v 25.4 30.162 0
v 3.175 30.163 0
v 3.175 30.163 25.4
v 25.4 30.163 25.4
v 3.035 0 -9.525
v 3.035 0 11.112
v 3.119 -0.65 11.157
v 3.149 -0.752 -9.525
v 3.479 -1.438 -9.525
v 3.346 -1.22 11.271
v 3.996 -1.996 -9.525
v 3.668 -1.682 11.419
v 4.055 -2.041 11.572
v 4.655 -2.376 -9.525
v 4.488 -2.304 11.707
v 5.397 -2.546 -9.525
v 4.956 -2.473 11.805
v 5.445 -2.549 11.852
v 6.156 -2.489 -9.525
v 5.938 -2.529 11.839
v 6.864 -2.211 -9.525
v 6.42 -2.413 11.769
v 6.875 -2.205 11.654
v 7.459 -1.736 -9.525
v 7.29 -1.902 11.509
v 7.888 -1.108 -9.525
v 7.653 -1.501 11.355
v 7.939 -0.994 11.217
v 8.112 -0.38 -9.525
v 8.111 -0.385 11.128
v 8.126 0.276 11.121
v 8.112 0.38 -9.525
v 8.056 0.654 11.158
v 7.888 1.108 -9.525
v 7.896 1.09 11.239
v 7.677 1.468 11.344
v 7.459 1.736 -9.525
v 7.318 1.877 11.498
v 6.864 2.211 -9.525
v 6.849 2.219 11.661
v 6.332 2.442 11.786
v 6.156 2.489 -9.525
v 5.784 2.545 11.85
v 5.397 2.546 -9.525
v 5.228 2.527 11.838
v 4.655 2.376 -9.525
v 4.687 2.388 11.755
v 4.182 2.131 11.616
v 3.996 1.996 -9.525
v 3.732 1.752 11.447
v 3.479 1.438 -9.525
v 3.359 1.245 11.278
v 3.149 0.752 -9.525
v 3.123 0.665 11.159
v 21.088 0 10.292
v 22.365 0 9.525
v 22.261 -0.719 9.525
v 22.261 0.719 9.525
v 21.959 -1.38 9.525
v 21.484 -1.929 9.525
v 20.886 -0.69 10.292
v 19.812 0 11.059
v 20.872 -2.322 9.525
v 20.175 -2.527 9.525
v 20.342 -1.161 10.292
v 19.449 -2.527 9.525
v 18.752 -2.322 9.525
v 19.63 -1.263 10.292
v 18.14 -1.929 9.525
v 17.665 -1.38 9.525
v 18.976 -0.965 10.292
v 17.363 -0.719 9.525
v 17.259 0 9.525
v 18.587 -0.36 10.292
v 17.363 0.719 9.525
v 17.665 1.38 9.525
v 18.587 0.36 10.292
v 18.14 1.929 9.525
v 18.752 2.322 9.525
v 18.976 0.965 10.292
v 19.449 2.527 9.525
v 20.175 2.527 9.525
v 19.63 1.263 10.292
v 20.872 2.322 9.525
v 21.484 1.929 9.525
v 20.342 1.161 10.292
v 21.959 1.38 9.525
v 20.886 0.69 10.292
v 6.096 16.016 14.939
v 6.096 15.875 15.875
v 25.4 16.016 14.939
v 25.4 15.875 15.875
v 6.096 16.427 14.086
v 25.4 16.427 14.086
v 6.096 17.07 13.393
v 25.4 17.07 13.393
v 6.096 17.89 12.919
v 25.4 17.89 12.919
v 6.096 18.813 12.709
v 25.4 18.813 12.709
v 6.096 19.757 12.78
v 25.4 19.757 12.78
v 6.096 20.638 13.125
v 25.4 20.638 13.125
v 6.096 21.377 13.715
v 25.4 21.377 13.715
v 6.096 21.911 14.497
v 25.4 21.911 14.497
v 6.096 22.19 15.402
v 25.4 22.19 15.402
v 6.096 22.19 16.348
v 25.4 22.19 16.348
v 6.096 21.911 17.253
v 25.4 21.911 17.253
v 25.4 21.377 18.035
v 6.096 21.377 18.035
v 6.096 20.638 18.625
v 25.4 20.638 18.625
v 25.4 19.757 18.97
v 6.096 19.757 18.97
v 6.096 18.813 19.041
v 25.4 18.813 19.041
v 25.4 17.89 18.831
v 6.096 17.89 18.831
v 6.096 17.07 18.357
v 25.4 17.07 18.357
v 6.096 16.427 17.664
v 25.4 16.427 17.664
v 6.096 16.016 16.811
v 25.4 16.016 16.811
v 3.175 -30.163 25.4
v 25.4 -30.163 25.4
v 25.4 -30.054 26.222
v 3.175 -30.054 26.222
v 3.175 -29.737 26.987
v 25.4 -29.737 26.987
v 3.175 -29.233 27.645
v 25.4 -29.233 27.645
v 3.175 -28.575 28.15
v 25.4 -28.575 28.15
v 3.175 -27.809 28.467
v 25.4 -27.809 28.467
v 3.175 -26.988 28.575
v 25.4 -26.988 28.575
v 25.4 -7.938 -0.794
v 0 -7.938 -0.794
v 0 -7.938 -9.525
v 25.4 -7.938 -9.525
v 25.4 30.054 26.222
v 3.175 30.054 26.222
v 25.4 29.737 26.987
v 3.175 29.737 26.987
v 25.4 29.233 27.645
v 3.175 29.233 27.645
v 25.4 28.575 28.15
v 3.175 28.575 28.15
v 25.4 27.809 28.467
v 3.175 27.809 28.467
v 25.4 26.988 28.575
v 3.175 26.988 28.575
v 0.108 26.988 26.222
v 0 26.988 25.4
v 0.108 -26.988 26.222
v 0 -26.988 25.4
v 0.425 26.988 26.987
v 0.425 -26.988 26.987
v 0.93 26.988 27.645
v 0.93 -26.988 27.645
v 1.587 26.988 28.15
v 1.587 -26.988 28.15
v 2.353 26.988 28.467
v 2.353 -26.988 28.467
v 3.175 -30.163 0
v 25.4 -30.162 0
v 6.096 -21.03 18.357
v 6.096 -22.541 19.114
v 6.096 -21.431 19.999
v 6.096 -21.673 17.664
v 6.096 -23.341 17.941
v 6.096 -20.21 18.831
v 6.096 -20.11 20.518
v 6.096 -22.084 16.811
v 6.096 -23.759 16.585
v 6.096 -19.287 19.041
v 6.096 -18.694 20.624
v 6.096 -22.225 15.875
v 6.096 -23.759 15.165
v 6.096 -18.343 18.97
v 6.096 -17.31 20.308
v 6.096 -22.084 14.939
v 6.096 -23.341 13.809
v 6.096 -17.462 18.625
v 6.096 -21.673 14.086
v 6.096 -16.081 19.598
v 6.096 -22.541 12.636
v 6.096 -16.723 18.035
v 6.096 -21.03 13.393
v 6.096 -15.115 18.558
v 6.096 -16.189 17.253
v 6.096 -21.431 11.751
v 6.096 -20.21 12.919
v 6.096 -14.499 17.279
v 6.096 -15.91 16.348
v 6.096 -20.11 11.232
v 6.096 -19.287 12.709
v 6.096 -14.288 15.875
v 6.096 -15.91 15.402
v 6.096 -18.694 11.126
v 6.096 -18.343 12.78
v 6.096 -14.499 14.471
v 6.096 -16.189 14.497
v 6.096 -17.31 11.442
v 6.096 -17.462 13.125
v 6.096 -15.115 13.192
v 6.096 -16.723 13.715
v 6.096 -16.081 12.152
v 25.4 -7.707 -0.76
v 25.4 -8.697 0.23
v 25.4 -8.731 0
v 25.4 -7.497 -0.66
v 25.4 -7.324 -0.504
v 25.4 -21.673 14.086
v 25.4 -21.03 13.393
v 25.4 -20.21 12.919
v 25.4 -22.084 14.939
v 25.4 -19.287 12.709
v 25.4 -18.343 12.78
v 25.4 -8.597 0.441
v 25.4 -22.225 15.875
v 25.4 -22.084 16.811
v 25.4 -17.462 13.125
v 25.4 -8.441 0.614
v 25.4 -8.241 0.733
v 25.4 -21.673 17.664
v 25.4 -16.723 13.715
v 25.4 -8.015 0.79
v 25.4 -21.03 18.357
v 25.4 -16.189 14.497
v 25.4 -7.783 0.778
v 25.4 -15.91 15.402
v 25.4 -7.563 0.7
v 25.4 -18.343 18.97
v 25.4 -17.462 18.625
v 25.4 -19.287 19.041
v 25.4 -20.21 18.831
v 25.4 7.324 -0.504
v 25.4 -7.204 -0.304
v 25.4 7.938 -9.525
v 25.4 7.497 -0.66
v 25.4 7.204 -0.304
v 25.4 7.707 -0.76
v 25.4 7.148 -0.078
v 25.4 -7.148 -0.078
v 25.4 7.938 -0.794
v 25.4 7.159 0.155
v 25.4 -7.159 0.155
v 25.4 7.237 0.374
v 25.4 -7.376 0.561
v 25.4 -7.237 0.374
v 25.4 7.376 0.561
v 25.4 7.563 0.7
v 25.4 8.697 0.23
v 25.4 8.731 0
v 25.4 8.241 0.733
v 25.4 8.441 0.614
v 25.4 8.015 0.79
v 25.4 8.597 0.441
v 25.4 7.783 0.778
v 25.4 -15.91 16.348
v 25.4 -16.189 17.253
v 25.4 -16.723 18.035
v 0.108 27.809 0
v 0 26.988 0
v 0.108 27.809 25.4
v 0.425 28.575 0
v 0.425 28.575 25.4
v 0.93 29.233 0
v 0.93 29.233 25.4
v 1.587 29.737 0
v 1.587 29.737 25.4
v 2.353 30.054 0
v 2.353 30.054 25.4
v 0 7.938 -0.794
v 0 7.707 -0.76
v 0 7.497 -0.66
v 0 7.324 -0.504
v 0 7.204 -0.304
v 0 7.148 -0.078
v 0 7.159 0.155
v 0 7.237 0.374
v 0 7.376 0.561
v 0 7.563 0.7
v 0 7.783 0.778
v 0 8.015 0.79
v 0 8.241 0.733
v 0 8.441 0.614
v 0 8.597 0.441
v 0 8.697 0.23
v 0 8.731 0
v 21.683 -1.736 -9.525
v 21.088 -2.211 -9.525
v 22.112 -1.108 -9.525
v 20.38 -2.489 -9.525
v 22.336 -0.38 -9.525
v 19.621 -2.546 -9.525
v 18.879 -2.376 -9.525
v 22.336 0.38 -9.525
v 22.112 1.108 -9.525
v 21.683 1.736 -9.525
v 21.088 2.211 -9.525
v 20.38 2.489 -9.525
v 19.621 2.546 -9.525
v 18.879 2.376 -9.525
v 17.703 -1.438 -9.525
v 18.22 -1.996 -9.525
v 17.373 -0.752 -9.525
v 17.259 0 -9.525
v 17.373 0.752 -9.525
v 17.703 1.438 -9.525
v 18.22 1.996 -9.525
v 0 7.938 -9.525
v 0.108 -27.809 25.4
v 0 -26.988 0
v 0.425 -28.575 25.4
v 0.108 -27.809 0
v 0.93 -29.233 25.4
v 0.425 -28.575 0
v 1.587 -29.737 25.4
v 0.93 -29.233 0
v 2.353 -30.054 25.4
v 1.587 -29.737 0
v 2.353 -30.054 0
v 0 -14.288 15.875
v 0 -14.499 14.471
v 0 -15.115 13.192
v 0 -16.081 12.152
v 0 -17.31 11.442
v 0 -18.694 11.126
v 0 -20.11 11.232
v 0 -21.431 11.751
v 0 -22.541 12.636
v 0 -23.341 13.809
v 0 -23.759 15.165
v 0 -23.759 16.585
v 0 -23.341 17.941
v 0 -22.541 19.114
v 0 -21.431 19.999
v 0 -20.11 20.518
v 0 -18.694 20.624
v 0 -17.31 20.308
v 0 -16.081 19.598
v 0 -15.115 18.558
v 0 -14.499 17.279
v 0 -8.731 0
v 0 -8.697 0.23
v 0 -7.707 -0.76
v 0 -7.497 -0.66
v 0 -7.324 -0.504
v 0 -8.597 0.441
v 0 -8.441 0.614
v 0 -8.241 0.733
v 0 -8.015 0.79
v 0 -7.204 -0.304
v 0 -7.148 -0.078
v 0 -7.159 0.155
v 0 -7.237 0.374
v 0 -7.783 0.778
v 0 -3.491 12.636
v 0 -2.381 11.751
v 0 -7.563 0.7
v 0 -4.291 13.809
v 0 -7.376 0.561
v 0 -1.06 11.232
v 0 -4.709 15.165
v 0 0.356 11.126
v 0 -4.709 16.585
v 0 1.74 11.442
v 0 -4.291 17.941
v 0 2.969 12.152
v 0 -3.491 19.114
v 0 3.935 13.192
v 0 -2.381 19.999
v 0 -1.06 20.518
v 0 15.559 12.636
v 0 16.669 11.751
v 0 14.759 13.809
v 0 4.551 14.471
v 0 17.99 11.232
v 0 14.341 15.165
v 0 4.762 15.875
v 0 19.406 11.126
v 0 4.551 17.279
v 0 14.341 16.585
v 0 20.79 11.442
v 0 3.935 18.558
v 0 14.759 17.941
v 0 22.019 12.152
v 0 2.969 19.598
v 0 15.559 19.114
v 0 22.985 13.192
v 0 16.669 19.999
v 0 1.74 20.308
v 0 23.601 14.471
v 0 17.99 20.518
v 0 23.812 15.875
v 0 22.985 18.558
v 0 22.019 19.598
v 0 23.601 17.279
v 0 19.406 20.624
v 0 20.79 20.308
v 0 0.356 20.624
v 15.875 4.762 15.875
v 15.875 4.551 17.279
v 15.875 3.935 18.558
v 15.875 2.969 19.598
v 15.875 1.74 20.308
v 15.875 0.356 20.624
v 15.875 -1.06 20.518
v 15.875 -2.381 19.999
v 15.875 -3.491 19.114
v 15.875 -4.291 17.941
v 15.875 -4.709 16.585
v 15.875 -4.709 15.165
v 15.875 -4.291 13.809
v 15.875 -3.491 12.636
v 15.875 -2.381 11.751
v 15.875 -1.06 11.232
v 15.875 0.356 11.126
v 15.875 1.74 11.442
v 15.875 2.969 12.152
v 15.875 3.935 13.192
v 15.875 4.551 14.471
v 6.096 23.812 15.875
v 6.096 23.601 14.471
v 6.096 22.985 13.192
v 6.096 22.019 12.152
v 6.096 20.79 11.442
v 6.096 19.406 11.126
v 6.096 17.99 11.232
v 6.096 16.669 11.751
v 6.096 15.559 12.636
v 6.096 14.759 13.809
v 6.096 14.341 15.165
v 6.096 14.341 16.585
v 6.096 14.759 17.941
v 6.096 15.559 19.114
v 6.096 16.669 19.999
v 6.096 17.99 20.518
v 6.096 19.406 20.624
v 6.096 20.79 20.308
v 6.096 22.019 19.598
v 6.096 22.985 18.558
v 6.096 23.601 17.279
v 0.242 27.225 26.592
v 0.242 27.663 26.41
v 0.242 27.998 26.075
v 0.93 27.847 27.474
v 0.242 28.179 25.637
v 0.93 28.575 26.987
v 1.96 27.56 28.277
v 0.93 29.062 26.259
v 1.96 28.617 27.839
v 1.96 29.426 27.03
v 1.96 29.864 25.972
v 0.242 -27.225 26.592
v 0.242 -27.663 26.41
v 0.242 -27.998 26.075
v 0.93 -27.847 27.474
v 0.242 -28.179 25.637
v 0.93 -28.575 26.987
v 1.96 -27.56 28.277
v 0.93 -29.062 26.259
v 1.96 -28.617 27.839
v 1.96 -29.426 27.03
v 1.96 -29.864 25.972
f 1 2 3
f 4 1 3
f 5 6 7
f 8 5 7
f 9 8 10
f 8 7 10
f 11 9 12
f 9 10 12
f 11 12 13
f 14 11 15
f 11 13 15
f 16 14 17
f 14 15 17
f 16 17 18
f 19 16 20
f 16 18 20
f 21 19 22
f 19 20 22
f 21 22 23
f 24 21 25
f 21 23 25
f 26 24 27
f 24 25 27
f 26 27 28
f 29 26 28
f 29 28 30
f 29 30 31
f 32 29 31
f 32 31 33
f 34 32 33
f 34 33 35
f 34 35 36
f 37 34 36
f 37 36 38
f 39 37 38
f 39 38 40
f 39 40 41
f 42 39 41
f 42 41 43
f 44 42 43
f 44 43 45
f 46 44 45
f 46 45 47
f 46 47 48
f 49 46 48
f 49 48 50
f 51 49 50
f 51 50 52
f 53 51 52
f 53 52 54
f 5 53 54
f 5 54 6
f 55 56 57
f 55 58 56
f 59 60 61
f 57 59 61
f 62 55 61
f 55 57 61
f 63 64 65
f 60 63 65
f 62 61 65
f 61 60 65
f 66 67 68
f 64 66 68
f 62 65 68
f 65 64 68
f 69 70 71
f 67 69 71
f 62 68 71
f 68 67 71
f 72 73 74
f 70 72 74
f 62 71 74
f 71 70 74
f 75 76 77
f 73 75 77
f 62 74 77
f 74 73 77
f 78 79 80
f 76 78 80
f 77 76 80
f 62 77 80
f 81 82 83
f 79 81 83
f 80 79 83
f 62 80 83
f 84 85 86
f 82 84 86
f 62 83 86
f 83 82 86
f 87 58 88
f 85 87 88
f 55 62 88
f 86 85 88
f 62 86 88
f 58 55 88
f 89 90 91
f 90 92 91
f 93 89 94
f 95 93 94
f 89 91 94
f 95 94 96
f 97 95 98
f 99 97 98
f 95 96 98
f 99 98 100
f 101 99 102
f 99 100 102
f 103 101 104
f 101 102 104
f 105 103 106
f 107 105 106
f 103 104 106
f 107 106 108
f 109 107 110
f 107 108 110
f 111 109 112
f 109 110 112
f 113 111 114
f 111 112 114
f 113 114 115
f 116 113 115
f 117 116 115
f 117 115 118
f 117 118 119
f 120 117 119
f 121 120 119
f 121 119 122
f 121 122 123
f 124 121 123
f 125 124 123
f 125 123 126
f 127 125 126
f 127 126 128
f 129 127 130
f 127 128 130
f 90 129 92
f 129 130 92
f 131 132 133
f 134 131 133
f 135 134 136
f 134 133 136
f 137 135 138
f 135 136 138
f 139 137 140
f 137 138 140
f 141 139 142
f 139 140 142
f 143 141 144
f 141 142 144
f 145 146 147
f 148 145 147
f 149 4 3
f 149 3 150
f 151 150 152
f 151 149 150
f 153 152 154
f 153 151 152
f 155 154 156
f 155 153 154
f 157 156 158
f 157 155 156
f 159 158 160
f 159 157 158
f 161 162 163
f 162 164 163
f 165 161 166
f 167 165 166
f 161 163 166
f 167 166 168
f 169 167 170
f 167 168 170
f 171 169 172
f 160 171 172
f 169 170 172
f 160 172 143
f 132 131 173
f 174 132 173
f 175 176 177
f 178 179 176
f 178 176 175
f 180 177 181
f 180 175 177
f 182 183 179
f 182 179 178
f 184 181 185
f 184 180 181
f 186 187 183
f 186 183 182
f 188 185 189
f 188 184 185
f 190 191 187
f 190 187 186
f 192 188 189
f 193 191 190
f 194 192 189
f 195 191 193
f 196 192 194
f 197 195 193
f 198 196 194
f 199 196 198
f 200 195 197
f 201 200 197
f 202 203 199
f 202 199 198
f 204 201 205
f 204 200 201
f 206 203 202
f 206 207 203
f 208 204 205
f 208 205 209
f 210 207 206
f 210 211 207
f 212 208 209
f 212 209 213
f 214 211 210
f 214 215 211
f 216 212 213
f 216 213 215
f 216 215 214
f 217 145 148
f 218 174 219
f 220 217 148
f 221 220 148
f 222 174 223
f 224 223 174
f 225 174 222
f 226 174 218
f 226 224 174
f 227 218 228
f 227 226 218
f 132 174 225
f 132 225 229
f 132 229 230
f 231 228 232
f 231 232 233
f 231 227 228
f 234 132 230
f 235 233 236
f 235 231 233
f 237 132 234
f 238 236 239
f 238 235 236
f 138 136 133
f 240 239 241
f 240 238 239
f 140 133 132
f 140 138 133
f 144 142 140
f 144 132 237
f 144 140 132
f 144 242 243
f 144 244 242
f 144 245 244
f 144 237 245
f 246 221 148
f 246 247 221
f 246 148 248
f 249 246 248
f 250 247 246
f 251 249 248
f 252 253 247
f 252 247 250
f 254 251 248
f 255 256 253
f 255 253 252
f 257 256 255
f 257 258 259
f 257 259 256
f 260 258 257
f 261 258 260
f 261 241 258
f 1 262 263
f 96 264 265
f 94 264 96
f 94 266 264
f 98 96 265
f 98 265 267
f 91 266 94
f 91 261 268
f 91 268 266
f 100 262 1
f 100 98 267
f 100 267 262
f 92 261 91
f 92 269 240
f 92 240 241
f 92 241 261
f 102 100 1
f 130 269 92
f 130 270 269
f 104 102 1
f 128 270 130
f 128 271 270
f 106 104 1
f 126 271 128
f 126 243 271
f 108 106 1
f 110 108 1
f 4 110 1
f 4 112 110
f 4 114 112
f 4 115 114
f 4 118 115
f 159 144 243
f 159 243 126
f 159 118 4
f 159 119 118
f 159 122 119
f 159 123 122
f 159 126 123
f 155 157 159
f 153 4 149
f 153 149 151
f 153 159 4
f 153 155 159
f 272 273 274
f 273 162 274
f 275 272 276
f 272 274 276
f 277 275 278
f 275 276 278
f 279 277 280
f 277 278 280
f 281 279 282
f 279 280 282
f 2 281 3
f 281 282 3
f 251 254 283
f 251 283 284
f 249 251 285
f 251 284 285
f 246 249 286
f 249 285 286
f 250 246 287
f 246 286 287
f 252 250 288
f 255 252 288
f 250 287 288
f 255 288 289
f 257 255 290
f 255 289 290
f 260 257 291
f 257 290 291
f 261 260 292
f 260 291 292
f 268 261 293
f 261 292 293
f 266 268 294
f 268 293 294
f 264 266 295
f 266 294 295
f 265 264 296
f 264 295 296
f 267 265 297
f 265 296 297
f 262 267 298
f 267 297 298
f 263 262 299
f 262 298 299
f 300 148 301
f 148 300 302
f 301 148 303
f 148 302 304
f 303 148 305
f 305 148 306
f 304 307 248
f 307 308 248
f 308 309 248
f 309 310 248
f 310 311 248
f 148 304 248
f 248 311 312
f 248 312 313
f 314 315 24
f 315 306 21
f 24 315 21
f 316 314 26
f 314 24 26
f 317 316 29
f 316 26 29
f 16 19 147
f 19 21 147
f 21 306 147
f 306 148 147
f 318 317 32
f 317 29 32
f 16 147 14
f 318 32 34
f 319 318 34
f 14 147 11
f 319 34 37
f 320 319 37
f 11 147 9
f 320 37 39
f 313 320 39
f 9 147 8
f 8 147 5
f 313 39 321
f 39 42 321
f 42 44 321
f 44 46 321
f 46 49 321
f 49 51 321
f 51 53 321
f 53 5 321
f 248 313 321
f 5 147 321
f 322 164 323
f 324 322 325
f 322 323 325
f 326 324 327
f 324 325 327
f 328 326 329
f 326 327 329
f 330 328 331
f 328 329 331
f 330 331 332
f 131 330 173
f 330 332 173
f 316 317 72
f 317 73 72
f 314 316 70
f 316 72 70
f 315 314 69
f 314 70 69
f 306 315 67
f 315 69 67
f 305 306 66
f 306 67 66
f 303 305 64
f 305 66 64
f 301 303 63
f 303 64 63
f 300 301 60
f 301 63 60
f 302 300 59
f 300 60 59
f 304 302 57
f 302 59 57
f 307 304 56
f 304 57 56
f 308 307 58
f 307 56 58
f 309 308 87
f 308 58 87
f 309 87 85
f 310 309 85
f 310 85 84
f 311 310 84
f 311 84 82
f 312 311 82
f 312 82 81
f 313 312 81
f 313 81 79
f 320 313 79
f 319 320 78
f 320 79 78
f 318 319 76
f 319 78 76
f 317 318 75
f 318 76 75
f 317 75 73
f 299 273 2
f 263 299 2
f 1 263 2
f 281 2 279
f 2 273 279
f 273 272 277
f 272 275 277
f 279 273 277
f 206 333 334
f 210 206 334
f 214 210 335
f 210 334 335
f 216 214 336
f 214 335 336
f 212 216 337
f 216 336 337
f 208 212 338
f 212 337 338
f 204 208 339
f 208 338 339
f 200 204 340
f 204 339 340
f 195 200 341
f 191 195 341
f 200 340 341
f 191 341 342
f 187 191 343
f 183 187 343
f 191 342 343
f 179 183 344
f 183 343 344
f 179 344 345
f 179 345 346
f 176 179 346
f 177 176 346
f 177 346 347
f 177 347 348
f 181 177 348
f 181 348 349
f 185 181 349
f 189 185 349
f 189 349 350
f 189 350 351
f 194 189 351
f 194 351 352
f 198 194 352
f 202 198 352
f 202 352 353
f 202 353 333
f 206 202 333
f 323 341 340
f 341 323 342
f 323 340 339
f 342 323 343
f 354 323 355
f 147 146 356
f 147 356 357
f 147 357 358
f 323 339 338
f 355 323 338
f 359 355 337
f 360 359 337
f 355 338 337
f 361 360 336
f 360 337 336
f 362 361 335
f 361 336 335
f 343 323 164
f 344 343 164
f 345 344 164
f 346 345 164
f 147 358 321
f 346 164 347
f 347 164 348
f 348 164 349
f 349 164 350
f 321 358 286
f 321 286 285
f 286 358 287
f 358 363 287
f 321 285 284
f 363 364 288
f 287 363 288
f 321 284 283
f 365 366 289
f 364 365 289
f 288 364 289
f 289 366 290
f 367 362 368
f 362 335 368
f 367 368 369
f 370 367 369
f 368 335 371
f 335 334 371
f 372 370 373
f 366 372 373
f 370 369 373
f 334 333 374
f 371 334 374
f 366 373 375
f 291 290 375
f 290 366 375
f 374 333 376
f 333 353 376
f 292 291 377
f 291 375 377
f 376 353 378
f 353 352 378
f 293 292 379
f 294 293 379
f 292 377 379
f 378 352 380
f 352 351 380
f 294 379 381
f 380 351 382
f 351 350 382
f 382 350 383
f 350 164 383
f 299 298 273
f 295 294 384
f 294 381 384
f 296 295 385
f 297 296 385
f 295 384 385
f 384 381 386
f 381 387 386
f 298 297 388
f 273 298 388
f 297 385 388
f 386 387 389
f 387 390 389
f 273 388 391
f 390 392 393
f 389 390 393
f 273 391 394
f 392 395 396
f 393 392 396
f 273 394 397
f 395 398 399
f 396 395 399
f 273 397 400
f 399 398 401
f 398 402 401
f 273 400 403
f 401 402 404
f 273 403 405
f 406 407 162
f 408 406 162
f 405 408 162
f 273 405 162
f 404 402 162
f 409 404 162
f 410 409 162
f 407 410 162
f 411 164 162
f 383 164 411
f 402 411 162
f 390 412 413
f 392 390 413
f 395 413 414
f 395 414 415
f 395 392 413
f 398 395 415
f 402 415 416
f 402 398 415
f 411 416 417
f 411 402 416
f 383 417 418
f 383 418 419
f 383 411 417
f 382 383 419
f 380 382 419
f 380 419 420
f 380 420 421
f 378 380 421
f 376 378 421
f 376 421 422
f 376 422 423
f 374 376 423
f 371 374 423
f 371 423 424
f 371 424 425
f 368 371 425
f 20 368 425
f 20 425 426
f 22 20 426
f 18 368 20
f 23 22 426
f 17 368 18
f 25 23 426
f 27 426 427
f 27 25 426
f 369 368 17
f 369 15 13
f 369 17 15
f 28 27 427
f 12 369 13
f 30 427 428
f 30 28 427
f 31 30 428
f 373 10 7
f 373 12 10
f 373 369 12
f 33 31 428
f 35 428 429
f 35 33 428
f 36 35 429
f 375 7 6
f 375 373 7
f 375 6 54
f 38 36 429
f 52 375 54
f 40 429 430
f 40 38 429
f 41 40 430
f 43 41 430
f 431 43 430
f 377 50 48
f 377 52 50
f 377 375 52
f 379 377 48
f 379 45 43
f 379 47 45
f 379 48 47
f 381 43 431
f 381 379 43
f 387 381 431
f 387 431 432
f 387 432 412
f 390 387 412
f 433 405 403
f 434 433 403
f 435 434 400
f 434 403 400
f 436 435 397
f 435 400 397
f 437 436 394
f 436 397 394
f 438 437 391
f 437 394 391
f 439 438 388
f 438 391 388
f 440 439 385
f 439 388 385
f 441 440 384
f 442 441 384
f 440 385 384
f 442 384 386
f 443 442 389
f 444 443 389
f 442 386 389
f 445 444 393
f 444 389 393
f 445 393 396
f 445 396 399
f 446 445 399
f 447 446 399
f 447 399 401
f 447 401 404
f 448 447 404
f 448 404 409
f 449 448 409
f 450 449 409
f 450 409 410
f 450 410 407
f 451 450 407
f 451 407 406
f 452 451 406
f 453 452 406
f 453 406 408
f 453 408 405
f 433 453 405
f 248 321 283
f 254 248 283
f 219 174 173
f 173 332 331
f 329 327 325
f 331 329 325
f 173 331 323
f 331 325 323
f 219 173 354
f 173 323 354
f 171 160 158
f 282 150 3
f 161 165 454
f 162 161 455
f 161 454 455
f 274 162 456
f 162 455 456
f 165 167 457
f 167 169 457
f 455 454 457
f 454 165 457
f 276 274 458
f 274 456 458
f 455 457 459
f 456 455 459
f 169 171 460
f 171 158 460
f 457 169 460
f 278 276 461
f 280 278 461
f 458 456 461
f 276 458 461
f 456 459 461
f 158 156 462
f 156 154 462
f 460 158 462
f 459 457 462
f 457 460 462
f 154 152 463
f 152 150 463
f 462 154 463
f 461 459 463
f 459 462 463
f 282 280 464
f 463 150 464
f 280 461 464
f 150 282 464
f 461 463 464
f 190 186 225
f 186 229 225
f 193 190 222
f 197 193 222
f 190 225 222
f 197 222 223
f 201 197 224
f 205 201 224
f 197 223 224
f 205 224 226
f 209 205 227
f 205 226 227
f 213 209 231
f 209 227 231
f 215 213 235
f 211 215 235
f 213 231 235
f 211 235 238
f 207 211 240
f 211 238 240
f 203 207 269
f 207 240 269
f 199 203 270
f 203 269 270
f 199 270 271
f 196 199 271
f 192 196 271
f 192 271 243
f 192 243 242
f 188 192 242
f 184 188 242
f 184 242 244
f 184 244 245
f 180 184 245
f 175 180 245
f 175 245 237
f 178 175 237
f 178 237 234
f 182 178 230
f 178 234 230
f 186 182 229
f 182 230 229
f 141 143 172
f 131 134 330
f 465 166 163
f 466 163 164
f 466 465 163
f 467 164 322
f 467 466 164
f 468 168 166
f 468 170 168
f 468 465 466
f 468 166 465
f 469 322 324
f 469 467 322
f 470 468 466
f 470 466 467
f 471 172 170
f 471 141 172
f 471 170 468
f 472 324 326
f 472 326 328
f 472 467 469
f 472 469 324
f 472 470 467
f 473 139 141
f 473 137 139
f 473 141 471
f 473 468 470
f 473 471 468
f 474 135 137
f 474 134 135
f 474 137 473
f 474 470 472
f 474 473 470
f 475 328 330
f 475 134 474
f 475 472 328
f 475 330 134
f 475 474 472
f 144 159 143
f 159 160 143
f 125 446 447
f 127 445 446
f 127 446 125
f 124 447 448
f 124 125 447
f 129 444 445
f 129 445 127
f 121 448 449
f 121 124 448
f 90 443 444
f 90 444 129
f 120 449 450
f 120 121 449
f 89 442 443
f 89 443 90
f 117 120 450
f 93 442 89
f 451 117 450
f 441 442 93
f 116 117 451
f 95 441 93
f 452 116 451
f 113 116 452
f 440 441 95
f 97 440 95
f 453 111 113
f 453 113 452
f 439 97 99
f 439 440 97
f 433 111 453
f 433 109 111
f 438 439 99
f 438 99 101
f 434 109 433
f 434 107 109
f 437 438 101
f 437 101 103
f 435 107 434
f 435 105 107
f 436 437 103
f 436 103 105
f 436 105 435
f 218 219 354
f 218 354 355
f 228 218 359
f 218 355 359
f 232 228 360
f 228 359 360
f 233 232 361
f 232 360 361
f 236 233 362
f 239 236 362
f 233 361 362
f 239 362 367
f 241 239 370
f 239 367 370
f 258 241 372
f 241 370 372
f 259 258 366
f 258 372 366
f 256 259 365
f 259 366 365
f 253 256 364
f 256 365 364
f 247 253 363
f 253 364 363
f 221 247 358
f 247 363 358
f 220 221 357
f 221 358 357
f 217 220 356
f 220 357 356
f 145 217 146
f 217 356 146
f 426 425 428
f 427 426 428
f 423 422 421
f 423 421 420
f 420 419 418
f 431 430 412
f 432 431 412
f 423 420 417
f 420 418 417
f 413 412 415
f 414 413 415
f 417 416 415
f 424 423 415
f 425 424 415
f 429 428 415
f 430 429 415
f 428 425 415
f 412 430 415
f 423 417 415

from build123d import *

# Parameters (mm, degrees)
F0_R           = 4.7625
F1_DEPTH       = 25.4
F2_D           = 6.35
F2_CBORE_D     = 9.525
F2_CBORE_DEPTH = 6.096
F3_DEPTH       = 15.875
F4_R           = 3.175
F6_D           = 5.1054
F6_DEPTH       = 25.4
F6_TIP         = 1.5338169022
F7_D           = 5.1054
F7_DEPTH       = 19.05
F7_TIP         = 1.5338169022


with BuildPart() as f1:
    # F0 (on Right) → F1 (new body)
    with BuildSketch(Plane.YZ):
        with BuildLine():
            Line((-7.9375, -9.525), (0, -9.525))
            Line((0, -9.525), (7.9375, -9.525))
            Line((7.9375, -9.525), (7.9375, -0.79375))
            ThreePointArc((7.9375, -0.79375), (7.3762339924, 0.5612660076), (8.73125, 0))
            Line((8.73125, 0), (30.1625, 0))
            Line((30.1625, 0), (30.1625, 28.575))
            Line((30.1625, 28.575), (0, 28.575))
            Line((0, 28.575), (-30.1625, 28.575))
            Line((-30.1625, 28.575), (-30.1625, 0))
            Line((-30.1625, 0), (-8.73125, 0))
            ThreePointArc((-8.73125, 0), (-7.3762339924, 0.5612660076), (-7.9375, -0.79375))
            Line((-7.9375, -0.79375), (-7.9375, -9.525))
        make_face()
        with Locations((0, 15.875)):
            Circle(F0_R, mode=Mode.SUBTRACT)
        with Locations((0, 15.875)):
            Circle(F0_R)
    extrude(amount=F1_DEPTH)

    # F2 (through all)
    with Locations(Plane(origin=(0, 0, 0), x_dir=(0, 1, 0), z_dir=(-1, 0, 0))):
        with Locations((-19.05, -15.875), (19.05, -15.875)):
            CounterBoreHole(F2_D / 2, F2_CBORE_D / 2, F2_CBORE_DEPTH)

    # F0 (on Right) → F3 (cut)
    with BuildSketch(Plane.YZ):
        with Locations((0, 15.875)):
            Circle(F0_R)
    extrude(amount=F3_DEPTH, mode=Mode.SUBTRACT)

    # F4
    f4_edges = [f1.edges().sort_by_distance(p)[0] for p in [
        (12.7, -30.1625, 28.575),
        (12.7, 30.1625, 28.575),
        (0, 0, 28.575),
        (0, -30.1625, 14.2875),
        (0, 30.1625, 14.2875),
    ]]
    fillet(f4_edges, radius=F4_R)

    # F6
    with Locations(Plane(origin=(0, 0, -9.525), x_dir=(1, 0, 0), z_dir=(0, 0, -1))):
        with Locations((5.588, 0)):
            Hole(F6_D / 2, depth=F6_DEPTH)
            with Locations((0, 0, -(F6_DEPTH + F6_TIP / 2))):  # 118° drill point
                Cone(0, F6_D / 2, F6_TIP, mode=Mode.SUBTRACT)

    # F7
    with Locations(Plane(origin=(0, 0, -9.525), x_dir=(1, 0, 0), z_dir=(0, 0, -1))):
        with Locations((19.812, 0)):
            Hole(F7_D / 2, depth=F7_DEPTH)
            with Locations((0, 0, -(F7_DEPTH + F7_TIP / 2))):  # 118° drill point
                Cone(0, F7_D / 2, F7_TIP, mode=Mode.SUBTRACT)


solid = f1.part
